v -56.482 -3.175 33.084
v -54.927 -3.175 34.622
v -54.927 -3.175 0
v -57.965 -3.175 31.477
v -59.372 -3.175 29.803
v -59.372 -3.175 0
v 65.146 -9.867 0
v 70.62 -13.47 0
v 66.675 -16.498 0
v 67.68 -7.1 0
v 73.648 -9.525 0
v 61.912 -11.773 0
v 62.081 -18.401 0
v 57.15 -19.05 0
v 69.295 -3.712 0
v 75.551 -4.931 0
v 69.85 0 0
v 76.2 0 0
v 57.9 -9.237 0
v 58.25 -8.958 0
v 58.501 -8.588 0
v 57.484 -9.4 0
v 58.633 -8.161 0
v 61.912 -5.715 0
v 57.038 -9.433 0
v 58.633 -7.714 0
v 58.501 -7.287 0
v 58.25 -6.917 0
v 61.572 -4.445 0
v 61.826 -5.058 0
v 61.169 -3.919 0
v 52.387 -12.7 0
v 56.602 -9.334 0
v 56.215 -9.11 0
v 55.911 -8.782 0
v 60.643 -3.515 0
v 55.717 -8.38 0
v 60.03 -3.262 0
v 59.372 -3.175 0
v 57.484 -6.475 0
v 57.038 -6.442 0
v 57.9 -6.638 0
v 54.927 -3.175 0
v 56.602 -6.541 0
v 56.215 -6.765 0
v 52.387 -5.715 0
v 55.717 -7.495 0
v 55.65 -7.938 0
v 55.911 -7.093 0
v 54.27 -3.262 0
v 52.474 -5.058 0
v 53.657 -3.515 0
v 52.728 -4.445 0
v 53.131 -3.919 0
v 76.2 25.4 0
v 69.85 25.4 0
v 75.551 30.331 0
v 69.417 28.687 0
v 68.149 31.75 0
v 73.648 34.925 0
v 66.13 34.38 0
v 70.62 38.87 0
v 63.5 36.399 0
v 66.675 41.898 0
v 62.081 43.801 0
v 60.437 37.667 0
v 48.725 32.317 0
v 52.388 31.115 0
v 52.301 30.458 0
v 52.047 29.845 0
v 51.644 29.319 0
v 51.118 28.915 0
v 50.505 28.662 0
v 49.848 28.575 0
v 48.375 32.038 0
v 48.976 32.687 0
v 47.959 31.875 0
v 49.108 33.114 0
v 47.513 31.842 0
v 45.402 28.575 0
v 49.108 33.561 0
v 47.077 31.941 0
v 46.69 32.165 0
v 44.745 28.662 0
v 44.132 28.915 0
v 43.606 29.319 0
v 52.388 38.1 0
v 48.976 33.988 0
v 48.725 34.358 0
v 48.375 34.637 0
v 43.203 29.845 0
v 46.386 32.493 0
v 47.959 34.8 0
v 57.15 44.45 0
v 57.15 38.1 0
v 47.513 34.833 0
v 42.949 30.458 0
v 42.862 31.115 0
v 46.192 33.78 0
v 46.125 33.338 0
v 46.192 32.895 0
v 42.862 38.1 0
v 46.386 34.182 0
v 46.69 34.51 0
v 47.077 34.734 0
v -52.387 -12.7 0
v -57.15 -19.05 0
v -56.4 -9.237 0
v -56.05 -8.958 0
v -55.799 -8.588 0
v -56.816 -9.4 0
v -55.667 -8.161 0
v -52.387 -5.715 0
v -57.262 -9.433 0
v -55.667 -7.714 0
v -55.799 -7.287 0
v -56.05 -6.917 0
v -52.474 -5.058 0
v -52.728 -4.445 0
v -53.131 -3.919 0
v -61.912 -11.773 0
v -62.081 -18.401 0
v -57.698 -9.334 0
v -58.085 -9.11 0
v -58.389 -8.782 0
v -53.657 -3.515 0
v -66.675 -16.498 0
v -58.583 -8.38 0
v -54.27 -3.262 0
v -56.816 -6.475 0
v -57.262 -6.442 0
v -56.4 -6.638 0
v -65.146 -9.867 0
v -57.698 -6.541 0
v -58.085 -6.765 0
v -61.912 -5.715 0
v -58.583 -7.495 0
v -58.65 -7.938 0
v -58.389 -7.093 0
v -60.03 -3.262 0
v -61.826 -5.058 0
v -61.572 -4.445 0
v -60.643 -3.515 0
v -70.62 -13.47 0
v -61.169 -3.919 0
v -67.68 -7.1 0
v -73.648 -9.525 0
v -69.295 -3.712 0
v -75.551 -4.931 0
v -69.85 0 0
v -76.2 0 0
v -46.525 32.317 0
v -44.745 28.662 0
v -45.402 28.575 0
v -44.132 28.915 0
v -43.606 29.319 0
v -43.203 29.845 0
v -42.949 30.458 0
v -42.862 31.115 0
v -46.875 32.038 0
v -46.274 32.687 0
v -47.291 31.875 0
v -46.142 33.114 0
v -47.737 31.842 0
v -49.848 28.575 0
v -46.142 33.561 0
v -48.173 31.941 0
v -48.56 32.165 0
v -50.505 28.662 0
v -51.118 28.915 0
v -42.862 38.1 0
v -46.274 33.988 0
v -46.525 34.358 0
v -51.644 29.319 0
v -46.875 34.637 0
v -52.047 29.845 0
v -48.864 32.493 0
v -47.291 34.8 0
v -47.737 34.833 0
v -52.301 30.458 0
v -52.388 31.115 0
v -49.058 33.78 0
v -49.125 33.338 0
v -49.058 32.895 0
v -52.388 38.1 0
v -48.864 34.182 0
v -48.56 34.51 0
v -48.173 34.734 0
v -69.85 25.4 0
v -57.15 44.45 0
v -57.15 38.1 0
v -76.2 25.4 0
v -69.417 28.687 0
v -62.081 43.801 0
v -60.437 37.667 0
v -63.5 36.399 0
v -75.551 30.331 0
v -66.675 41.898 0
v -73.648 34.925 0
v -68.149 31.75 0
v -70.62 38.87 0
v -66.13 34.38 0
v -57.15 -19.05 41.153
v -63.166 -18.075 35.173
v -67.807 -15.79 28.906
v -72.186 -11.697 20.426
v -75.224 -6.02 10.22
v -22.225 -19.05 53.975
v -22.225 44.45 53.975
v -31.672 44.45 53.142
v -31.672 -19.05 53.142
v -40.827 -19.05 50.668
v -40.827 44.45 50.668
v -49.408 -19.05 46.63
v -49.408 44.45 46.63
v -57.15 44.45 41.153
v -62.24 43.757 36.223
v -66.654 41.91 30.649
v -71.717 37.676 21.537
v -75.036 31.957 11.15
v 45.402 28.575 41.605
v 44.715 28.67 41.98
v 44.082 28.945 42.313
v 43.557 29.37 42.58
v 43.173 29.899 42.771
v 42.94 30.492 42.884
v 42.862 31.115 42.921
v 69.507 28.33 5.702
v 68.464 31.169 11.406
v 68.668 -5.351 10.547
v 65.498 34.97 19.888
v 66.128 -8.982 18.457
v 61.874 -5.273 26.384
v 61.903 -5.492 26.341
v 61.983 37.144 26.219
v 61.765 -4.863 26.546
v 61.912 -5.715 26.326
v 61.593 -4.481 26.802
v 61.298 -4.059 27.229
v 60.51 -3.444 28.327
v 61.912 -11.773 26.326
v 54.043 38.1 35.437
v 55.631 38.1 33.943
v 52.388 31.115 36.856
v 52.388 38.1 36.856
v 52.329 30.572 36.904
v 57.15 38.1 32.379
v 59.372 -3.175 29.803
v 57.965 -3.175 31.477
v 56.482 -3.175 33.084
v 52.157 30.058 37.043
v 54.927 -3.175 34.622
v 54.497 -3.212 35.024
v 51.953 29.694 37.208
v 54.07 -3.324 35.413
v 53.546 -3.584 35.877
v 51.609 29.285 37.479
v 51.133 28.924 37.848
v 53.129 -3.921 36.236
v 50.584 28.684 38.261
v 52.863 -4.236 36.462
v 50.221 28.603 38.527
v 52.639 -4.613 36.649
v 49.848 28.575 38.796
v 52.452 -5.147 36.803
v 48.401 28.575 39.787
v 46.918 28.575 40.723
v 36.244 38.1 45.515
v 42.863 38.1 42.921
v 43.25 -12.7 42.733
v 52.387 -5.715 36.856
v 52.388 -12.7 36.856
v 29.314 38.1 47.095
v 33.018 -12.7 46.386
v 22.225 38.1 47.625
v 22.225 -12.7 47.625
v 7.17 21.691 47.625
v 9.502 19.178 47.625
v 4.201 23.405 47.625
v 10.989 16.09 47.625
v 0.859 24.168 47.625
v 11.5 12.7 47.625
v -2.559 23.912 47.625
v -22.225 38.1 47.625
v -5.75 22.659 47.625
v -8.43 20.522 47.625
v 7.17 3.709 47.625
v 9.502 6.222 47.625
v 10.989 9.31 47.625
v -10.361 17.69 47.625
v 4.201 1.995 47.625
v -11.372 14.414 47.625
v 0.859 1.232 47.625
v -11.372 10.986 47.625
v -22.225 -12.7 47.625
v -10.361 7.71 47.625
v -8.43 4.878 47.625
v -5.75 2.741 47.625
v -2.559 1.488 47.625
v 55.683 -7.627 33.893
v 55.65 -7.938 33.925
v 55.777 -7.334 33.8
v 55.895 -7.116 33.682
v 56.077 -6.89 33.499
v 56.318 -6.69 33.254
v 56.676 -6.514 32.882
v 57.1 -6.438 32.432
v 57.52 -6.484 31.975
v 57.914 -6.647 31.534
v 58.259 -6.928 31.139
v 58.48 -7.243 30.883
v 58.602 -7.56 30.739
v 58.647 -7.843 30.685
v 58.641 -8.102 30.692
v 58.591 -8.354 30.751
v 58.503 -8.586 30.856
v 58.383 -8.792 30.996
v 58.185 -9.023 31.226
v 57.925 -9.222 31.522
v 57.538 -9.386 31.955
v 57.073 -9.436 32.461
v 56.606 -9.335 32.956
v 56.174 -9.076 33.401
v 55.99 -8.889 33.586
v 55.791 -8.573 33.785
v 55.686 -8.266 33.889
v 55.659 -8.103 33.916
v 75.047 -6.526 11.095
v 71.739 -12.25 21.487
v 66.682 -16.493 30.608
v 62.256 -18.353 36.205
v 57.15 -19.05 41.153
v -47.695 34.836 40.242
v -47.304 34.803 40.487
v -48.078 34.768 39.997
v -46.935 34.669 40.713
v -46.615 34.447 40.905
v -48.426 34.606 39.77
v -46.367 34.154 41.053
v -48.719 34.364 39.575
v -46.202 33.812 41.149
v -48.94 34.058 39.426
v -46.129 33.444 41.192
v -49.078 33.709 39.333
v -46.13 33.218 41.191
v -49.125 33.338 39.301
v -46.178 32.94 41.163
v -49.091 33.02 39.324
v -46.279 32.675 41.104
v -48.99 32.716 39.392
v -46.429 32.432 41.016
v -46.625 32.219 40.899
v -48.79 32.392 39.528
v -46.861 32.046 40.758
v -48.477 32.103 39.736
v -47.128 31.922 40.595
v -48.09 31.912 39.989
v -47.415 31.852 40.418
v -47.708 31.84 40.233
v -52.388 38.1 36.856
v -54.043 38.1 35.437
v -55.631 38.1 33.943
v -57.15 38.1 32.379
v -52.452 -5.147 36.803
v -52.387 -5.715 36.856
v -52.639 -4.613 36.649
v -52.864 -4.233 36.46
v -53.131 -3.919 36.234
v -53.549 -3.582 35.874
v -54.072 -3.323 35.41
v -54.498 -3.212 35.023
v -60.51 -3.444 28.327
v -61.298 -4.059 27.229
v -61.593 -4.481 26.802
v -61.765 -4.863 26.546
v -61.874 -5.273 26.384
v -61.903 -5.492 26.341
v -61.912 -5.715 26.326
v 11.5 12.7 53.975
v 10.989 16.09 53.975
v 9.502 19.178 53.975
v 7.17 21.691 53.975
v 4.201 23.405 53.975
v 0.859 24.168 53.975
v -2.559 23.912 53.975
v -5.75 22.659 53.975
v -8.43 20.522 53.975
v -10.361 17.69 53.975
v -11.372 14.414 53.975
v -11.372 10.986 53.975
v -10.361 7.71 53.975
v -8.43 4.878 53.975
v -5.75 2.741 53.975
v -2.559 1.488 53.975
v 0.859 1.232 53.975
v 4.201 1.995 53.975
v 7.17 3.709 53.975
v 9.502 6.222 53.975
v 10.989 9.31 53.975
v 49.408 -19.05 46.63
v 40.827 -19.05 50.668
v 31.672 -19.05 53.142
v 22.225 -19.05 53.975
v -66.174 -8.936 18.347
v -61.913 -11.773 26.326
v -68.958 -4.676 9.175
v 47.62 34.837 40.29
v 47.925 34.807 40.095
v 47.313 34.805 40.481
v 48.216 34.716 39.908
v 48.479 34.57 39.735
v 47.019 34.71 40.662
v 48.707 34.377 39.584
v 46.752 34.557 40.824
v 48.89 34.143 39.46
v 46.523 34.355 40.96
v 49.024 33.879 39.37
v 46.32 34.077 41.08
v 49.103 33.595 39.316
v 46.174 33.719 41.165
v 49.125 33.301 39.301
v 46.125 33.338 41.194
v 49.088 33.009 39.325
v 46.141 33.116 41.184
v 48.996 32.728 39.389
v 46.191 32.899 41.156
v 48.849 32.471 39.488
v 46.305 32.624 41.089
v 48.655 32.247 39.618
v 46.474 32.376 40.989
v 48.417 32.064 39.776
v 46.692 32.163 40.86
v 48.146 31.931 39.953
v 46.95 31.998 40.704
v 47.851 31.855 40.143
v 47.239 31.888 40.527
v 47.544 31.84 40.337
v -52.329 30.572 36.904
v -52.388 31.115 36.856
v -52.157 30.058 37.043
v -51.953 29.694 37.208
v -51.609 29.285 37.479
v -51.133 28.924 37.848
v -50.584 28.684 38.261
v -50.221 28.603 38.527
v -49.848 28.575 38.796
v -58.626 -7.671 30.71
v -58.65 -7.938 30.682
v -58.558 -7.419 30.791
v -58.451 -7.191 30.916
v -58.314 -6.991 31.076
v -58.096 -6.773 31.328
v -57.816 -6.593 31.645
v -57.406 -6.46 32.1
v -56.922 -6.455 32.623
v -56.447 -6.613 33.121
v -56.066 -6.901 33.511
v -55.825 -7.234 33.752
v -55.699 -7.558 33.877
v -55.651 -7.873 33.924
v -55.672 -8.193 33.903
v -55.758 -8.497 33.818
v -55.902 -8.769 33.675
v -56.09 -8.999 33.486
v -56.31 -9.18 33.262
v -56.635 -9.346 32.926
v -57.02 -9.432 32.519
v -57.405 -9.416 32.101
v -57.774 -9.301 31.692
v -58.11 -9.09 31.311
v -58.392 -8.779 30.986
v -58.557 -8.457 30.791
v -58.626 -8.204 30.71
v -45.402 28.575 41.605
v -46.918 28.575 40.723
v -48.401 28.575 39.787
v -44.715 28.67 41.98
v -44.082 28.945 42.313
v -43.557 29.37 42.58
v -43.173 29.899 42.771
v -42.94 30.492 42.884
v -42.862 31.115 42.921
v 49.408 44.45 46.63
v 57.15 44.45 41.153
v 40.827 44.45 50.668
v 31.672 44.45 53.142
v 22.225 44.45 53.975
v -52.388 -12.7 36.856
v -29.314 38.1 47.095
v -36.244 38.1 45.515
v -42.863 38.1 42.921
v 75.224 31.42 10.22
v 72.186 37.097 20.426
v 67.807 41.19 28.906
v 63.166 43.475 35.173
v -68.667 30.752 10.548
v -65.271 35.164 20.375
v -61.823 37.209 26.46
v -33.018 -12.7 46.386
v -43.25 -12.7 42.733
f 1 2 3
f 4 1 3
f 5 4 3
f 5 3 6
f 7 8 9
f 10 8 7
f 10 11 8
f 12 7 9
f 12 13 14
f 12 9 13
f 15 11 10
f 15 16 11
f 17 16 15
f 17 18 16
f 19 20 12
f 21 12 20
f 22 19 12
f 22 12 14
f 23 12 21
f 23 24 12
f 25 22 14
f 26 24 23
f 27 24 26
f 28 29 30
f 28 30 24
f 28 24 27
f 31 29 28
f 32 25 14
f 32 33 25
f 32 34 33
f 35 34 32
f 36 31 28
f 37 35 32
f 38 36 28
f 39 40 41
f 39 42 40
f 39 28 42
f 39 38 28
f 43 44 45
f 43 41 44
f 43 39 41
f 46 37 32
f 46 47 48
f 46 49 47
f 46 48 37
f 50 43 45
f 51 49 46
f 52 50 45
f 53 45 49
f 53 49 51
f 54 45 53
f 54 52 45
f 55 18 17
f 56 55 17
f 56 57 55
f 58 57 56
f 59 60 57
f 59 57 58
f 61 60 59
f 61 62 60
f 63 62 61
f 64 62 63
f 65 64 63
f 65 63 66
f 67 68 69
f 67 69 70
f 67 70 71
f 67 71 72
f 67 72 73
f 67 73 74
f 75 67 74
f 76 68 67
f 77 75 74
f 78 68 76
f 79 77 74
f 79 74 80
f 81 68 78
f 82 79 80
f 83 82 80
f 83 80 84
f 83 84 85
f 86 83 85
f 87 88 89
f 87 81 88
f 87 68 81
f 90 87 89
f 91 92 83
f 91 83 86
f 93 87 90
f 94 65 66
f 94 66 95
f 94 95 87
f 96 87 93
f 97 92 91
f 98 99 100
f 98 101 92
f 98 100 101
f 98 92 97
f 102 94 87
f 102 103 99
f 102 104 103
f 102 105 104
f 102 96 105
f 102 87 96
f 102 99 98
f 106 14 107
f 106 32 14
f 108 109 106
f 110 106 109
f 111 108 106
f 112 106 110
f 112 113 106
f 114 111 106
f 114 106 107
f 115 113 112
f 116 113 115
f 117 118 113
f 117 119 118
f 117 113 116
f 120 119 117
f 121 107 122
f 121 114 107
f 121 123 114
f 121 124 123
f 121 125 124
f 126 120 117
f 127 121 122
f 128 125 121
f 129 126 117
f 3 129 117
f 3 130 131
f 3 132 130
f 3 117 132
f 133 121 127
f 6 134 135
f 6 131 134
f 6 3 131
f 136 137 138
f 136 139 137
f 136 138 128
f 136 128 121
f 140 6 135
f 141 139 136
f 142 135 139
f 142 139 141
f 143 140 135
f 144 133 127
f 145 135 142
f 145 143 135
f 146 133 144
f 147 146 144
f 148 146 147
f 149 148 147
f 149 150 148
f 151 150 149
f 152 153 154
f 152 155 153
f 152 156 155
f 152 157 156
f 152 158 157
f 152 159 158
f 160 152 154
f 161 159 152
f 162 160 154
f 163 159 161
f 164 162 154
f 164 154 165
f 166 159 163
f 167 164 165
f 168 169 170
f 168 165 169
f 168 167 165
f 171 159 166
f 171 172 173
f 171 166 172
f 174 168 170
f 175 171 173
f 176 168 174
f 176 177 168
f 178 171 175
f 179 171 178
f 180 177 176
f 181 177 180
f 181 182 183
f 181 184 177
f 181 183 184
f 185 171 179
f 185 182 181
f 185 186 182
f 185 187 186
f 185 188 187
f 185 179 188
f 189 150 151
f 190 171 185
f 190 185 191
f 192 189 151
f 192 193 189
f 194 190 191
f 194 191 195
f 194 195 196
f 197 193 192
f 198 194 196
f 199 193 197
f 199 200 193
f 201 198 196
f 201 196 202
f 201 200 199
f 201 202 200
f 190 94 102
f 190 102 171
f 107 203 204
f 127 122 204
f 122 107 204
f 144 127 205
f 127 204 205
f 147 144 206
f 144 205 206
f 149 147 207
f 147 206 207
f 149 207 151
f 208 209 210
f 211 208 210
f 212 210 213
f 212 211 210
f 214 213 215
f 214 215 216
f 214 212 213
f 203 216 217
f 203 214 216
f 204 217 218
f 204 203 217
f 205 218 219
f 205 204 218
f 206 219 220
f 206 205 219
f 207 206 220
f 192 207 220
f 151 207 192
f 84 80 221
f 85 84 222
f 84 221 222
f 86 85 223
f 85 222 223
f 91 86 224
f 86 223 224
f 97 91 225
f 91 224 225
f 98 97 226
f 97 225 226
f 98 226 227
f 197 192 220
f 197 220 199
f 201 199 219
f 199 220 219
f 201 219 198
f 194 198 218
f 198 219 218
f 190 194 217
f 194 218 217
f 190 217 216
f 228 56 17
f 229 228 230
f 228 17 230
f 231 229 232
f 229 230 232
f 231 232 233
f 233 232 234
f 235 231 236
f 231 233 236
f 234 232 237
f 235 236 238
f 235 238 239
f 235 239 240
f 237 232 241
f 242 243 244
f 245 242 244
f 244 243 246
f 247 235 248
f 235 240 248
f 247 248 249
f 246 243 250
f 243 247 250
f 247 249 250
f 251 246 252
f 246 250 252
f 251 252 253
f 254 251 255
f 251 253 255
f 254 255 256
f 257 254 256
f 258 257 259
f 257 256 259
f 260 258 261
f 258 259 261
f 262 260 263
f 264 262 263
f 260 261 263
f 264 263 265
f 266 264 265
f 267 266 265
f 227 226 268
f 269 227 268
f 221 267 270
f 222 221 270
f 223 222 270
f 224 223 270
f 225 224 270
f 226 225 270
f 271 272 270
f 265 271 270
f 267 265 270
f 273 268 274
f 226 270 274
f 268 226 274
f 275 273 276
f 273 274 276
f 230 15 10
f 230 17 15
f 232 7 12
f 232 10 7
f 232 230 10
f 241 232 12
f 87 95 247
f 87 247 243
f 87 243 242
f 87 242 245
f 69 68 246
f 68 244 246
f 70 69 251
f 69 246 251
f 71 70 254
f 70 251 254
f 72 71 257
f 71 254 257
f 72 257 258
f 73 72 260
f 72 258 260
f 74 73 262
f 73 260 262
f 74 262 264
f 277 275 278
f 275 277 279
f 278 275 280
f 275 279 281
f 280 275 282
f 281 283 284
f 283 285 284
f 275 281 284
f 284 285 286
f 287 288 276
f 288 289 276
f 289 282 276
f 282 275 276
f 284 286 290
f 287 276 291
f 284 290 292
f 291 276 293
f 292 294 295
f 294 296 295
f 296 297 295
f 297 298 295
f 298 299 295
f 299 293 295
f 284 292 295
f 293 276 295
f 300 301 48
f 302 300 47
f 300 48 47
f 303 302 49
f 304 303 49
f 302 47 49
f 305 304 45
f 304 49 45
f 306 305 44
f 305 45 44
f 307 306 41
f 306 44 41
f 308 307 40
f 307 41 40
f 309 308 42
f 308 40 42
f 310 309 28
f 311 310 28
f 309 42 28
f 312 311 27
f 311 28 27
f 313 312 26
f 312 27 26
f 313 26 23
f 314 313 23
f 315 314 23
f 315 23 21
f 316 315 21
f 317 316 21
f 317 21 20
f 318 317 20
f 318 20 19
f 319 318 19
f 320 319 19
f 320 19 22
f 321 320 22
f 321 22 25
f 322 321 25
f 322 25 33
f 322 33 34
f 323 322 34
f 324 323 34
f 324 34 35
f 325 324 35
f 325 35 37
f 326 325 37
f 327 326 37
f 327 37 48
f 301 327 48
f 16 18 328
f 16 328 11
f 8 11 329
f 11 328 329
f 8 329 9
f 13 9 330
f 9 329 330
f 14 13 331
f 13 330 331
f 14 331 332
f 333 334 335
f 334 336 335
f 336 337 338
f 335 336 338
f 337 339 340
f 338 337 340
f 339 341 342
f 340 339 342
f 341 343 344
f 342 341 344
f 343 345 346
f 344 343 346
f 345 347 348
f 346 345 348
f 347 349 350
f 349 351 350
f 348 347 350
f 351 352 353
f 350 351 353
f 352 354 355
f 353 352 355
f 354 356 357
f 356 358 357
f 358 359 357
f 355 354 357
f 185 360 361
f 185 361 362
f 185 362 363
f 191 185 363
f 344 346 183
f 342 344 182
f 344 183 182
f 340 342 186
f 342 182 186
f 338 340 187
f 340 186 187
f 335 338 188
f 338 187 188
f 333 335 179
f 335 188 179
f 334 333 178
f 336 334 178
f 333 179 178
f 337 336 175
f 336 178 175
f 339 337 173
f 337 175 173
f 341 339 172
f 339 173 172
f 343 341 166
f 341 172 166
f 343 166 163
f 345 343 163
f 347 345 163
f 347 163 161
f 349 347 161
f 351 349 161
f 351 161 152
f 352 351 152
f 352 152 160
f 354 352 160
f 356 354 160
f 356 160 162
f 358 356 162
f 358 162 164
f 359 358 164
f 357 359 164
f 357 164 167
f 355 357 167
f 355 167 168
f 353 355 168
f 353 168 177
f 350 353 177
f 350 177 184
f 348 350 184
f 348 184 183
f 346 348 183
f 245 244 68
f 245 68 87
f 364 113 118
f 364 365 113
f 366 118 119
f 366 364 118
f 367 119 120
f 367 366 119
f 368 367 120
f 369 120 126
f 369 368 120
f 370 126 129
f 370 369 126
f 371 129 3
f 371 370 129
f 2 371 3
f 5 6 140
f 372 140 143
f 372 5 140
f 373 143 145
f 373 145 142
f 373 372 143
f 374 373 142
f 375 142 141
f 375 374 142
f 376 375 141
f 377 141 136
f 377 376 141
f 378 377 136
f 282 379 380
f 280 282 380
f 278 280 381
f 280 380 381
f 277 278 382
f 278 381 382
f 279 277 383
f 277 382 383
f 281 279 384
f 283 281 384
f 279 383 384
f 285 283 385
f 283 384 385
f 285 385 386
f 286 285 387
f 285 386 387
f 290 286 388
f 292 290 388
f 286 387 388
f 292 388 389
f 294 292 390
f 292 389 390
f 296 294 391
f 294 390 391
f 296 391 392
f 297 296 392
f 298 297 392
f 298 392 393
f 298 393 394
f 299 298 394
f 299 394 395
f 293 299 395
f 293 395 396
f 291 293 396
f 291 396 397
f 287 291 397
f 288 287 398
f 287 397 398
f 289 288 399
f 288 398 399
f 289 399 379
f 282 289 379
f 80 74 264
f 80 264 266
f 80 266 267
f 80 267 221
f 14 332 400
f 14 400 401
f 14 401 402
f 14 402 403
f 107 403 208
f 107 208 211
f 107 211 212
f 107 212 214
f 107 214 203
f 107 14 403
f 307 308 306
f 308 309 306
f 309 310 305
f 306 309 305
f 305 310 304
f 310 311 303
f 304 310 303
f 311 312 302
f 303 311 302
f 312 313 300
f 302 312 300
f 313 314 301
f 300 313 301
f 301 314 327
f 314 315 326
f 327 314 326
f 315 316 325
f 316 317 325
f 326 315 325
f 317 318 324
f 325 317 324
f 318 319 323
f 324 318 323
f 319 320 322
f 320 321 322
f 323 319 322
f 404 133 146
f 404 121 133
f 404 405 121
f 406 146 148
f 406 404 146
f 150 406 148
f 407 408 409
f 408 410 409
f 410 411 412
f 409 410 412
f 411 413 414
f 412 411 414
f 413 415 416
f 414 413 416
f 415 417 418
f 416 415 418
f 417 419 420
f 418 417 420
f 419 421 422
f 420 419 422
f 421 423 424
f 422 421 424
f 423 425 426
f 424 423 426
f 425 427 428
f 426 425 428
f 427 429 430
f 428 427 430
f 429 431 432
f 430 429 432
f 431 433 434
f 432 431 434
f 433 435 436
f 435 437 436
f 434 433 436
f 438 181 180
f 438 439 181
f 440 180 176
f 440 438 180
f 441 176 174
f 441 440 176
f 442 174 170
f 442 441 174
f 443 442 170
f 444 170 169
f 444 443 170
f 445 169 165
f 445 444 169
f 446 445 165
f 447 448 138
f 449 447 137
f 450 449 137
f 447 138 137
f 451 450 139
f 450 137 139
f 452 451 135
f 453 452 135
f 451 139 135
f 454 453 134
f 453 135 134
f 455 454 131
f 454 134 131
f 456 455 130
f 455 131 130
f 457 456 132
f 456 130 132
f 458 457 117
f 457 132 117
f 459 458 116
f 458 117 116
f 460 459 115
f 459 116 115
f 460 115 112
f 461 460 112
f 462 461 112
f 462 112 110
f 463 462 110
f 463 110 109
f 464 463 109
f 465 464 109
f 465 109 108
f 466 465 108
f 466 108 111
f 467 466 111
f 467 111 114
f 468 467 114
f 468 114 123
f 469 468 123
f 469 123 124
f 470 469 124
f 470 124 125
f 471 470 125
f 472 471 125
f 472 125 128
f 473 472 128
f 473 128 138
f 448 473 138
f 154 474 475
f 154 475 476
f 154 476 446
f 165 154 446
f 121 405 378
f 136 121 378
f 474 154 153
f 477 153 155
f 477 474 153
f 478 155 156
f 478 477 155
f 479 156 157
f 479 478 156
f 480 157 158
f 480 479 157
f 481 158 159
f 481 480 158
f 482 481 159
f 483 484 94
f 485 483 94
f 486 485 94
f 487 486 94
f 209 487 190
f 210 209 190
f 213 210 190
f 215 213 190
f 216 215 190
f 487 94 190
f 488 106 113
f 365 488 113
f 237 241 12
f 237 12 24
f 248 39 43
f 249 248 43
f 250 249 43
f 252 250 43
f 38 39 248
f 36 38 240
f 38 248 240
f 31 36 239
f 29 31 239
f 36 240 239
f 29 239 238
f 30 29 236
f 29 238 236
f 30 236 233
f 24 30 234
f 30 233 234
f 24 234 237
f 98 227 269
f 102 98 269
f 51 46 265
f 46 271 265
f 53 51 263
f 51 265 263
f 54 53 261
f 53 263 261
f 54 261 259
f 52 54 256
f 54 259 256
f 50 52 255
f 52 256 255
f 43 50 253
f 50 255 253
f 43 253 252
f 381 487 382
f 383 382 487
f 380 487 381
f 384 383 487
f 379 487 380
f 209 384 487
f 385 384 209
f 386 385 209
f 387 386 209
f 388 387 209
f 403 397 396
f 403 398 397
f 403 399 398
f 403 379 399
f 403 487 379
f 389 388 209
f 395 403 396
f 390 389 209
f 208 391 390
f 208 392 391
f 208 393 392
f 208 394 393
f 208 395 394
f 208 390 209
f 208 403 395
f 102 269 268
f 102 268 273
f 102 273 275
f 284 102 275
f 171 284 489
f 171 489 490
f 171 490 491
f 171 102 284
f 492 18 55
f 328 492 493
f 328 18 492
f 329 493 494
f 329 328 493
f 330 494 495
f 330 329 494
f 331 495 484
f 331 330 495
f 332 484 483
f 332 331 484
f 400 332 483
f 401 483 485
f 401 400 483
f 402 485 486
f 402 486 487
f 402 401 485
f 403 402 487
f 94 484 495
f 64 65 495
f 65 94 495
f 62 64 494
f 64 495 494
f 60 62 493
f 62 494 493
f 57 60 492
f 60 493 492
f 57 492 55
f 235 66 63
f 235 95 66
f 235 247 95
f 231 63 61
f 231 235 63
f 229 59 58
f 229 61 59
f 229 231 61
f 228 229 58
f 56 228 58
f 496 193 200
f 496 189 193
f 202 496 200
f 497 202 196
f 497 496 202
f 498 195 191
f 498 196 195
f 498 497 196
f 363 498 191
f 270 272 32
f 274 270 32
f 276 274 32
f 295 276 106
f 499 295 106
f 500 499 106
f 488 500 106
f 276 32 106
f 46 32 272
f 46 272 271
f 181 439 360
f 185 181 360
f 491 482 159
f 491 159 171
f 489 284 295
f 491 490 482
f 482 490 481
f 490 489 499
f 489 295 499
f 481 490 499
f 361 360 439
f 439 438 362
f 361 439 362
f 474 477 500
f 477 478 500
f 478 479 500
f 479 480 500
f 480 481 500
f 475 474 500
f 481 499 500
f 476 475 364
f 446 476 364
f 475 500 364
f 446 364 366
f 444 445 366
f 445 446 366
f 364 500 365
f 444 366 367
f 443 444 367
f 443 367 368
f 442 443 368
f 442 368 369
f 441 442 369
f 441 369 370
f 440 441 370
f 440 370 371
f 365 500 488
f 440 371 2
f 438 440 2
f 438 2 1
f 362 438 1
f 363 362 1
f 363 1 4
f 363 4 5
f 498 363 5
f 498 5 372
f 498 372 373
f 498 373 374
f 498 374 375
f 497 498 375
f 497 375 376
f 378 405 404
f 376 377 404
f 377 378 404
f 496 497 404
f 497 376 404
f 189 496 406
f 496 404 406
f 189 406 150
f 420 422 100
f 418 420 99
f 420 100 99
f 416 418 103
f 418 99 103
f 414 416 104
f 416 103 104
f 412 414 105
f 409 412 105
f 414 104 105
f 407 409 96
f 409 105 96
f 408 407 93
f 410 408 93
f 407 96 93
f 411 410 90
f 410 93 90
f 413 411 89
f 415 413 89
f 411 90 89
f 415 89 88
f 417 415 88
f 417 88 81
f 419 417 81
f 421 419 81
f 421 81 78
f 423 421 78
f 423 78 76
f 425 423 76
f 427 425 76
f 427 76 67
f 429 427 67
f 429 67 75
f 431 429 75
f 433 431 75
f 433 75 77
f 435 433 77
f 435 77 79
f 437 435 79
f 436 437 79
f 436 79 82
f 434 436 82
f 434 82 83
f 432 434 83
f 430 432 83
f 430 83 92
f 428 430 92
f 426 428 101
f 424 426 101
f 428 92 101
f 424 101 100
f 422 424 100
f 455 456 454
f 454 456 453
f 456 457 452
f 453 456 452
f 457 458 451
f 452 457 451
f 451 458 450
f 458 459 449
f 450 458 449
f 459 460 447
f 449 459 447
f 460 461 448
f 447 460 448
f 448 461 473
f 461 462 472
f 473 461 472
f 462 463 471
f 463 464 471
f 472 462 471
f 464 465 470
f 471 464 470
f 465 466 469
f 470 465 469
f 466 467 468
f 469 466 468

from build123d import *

# Parameters (mm, degrees)
BOSS_EXTRUDE2_DEPTH      = 44.45
BOSS_EXTRUDE2_DEPTH_BACK = 19.05
CUT_EXTRUDE_THIN1_DEPTH  = 104.419258966
SHELL1_T                 = -6.35
SKETCH5_R                = 11.5
CUT_EXTRUDE1_DEPTH       = 6.35
BOSS_EXTRUDE3_REACH      = 105.419
SKETCH8_W                = 9.525
SKETCH8_H                = 9.525
SKETCH8_R                = 1.5
FILLET1_R                = 2.54


with BuildPart() as part:
    # Sketch3 → Boss-Extrude2 (new, two sides: drawn at the far end of the back side and taken through both)
    with BuildSketch(Plane(origin=(0, 0, 0), x_dir=(1, 0, 0), z_dir=(0, 1, 0)).offset(-BOSS_EXTRUDE2_DEPTH_BACK)):
        with BuildLine():
            Line((-76.2, 0), (76.2, 0))
            ThreePointArc((76.2, 0), (60.391088515, -38.166088515), (22.225, -53.975))
            Line((22.225, -53.975), (-22.225, -53.975))
            ThreePointArc((-22.225, -53.975), (-60.391088515, -38.166088515), (-76.2, 0))
        make_face()
    extrude(amount=BOSS_EXTRUDE2_DEPTH + BOSS_EXTRUDE2_DEPTH_BACK)

    # Sketch4 → Cut-Extrude-Thin1 (cut, through all)
    with BuildSketch(Plane.XY.offset(53.975)):
        with BuildLine():
            Line((88.9, 25.4), (88.9, 0))
            ThreePointArc((88.9, 0), (79.600640303, -22.450640303), (57.15, -31.75))
            Line((57.15, -31.75), (-57.15, -31.75))
            ThreePointArc((-57.15, -31.75), (-79.600640303, -22.450640303), (-88.9, 0))
            Line((-88.9, 0), (-88.9, 25.4))
            ThreePointArc((-88.9, 25.4), (-79.600640303, 47.850640303), (-57.15, 57.15))
            Line((-57.15, 57.15), (57.15, 57.15))
            ThreePointArc((57.15, 57.15), (79.600640303, 47.850640303), (88.9, 25.4))
        make_face()
        with BuildLine():
            Line((76.2, 25.4), (76.2, 0))
            ThreePointArc((76.2, 0), (70.620384182, -13.470384182), (57.15, -19.05))
            Line((57.15, -19.05), (-57.15, -19.05))
            ThreePointArc((-57.15, -19.05), (-70.620384182, -13.470384182), (-76.2, 0))
            Line((-76.2, 0), (-76.2, 25.4))
            ThreePointArc((-76.2, 25.4), (-70.620384182, 38.870384182), (-57.15, 44.45))
            Line((-57.15, 44.45), (57.15, 44.45))
            ThreePointArc((57.15, 44.45), (70.620384182, 38.870384182), (76.2, 25.4))
        make_face(mode=Mode.SUBTRACT)
    extrude(amount=-CUT_EXTRUDE_THIN1_DEPTH, mode=Mode.SUBTRACT)

    # Shell1
    shell1_openings = [part.faces().sort_by_distance(p)[0] for p in [
        (0, 12.7, 0),
    ]]
    offset(amount=SHELL1_T, openings=shell1_openings)

    # Sketch5 → Cut-Extrude1 (cut)
    with BuildSketch(Plane.XY.offset(53.975)):
        with Locations((0, 12.7)):
            Circle(SKETCH5_R)
    extrude(amount=-CUT_EXTRUDE1_DEPTH, mode=Mode.SUBTRACT)

    # Sketch8 → Boss-Extrude3 (add, up to next)
    with BuildSketch(Plane(origin=(0, 0, 0), x_dir=(-1, 0, 0), z_dir=(0, 0, -1)), mode=Mode.PRIVATE) as boss_extrude3_sk1:
        with Locations((-47.625, 33.3375)):
            Rectangle(SKETCH8_W, SKETCH8_H)
        with Locations((-47.625, 33.3375)):
            Circle(SKETCH8_R, mode=Mode.SUBTRACT)
    boss_extrude3_tool1 = extrude(boss_extrude3_sk1.sketch, amount=-BOSS_EXTRUDE3_REACH, mode=Mode.PRIVATE) - part.part
    # Sketch8 → Boss-Extrude3 (add, up to next)
    with BuildSketch(Plane(origin=(0, 0, 0), x_dir=(-1, 0, 0), z_dir=(0, 0, -1)), mode=Mode.PRIVATE) as boss_extrude3_sk2:
        with Locations((-57.15, -7.9375)):
            Rectangle(SKETCH8_W, SKETCH8_H)
        with Locations((-57.15, -7.9375)):
            Circle(SKETCH8_R, mode=Mode.SUBTRACT)
    boss_extrude3_tool2 = extrude(boss_extrude3_sk2.sketch, amount=-BOSS_EXTRUDE3_REACH, mode=Mode.PRIVATE) - part.part
    # Sketch8 → Boss-Extrude3 (add, up to next)
    with BuildSketch(Plane(origin=(0, 0, 0), x_dir=(-1, 0, 0), z_dir=(0, 0, -1)), mode=Mode.PRIVATE) as boss_extrude3_sk3:
        with Locations((57.15, -7.9375)):
            Rectangle(SKETCH8_W, SKETCH8_H)
        with Locations((57.15, -7.9375)):
            Circle(SKETCH8_R, mode=Mode.SUBTRACT)
    boss_extrude3_tool3 = extrude(boss_extrude3_sk3.sketch, amount=-BOSS_EXTRUDE3_REACH, mode=Mode.PRIVATE) - part.part
    # Sketch8 → Boss-Extrude3 (add, up to next)
    with BuildSketch(Plane(origin=(0, 0, 0), x_dir=(-1, 0, 0), z_dir=(0, 0, -1)), mode=Mode.PRIVATE) as boss_extrude3_sk4:
        with Locations((47.625, 33.3375)):
            Rectangle(SKETCH8_W, SKETCH8_H)
        with Locations((47.625, 33.3375)):
            Circle(SKETCH8_R, mode=Mode.SUBTRACT)
    boss_extrude3_tool4 = extrude(boss_extrude3_sk4.sketch, amount=-BOSS_EXTRUDE3_REACH, mode=Mode.PRIVATE) - part.part
    add(boss_extrude3_tool1.solids().sort_by_distance((47.625, 28.709704, 0))[0])
    add(boss_extrude3_tool2.solids().sort_by_distance((57.15, -3.309704, 0))[0])
    add(boss_extrude3_tool3.solids().sort_by_distance((-52.522204, -7.9375, 0))[0])
    add(boss_extrude3_tool4.solids().sort_by_distance((-47.625, 28.709704, 0))[0])

    # Fillet1
    fillet1_edges = [part.edges().sort_by_distance(p)[0] for p in [
        (42.8625, 28.575, 21.460628012),
        (52.3875, 28.575, 18.427996491),
        (61.9125, -3.175, 13.162854637),
        (52.3875, -3.175, 18.427996491),
        (-52.3875, -3.175, 18.427996491),
        (-61.9125, -3.175, 13.162854637),
        (-52.3875, 28.575, 18.427996491),
        (-42.8625, 28.575, 21.460628012),
    ]]
    fillet(fillet1_edges, radius=FILLET1_R)


solid = part.part
